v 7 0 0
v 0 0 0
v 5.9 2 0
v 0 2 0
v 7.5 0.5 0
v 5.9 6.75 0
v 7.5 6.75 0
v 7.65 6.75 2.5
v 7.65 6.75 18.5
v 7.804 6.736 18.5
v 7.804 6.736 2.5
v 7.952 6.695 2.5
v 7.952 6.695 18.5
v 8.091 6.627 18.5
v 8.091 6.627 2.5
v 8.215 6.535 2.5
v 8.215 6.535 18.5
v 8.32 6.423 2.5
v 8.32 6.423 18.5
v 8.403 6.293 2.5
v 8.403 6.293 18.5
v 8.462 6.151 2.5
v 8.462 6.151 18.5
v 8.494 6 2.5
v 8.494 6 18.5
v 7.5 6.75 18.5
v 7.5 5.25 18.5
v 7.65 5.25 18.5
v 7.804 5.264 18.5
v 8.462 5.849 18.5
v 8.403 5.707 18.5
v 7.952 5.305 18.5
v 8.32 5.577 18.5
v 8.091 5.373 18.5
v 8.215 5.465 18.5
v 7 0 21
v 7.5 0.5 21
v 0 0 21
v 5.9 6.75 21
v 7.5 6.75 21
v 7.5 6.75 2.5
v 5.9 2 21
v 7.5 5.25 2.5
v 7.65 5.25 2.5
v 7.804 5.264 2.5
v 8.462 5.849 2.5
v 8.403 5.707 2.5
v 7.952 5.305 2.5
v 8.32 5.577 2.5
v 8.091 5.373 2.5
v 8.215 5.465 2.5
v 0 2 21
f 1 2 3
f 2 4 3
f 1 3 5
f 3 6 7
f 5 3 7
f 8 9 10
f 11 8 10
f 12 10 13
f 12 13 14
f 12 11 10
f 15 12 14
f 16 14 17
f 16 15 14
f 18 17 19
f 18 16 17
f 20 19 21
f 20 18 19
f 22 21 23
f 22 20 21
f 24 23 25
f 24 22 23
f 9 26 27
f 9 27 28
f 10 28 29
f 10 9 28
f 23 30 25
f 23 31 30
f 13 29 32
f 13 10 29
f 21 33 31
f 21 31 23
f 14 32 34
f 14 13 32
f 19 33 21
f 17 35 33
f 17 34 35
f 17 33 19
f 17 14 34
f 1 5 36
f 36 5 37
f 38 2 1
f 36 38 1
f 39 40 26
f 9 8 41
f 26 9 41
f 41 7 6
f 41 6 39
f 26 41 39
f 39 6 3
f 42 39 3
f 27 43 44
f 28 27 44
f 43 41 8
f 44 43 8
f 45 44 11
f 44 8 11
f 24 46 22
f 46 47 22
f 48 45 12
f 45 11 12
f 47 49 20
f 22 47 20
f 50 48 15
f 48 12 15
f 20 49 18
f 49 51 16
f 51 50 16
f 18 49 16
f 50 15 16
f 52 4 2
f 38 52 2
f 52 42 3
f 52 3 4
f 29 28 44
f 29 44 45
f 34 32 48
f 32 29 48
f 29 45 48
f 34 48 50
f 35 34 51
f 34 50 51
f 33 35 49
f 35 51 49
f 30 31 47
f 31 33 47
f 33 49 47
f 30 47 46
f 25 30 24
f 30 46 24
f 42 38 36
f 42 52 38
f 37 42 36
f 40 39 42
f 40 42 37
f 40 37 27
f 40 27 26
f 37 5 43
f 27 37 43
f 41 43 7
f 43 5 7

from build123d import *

# Parameters (mm, degrees)
F1_DEPTH    = 21
F2_START    = 2.5
F0_W        = 1
F0_H        = 1.5
F2_DEPTH    = 16
F3_SIZE     = 0.5
F4_T1_DEPTH = 20.25


# Not quite as in the source:
# - a fillet or chamfer that OpenCascade refuses, or shapes differently, is made with other operations: its cross-section is extruded or revolved along the edge and cut away or added


with BuildPart() as f1:
    # F0 (on Top) → F1 (new body)
    with BuildSketch(Plane.XY):
        Polygon((0, 2), (0, 0), (7.5, 0), (7.5, 5.25), (7.5, 6.75), (5.9, 6.75), (5.9, 2), align=None)
    extrude(amount=F1_DEPTH)

    # F0 (on Top) → F2 (join)
    with BuildSketch(Plane.XY.offset(F2_START)):
        with Locations((8, 6)):
            Rectangle(F0_W, F0_H)
    extrude(amount=F2_DEPTH)

    # F3
    f3_edges = [f1.edges().sort_by_distance(p)[0] for p in [
        (7.5, 0, 10.5),
    ]]
    chamfer(f3_edges, length=F3_SIZE)

    # F4: fillet of radius 0.85 on 2 edges, made by hand

    # F4_s2 → F4_t1 (cut)
    with BuildSketch(Plane.XY.offset(0.375)):
        with BuildLine():
            ThreePointArc((7.65, 6.75), (8.251040764, 6.501040764), (8.5, 5.9))
            Line((8.5, 5.9), (8.5, 6.75))
            Line((8.5, 6.75), (7.65, 6.75))
        make_face()
        with BuildLine():
            ThreePointArc((7.65, 5.25), (8.251040764, 5.498959236), (8.5, 6.1))
            Line((8.5, 6.1), (8.5, 5.25))
            Line((8.5, 5.25), (7.65, 5.25))
        make_face()
    extrude(amount=F4_T1_DEPTH, mode=Mode.SUBTRACT)


solid = f1.part
